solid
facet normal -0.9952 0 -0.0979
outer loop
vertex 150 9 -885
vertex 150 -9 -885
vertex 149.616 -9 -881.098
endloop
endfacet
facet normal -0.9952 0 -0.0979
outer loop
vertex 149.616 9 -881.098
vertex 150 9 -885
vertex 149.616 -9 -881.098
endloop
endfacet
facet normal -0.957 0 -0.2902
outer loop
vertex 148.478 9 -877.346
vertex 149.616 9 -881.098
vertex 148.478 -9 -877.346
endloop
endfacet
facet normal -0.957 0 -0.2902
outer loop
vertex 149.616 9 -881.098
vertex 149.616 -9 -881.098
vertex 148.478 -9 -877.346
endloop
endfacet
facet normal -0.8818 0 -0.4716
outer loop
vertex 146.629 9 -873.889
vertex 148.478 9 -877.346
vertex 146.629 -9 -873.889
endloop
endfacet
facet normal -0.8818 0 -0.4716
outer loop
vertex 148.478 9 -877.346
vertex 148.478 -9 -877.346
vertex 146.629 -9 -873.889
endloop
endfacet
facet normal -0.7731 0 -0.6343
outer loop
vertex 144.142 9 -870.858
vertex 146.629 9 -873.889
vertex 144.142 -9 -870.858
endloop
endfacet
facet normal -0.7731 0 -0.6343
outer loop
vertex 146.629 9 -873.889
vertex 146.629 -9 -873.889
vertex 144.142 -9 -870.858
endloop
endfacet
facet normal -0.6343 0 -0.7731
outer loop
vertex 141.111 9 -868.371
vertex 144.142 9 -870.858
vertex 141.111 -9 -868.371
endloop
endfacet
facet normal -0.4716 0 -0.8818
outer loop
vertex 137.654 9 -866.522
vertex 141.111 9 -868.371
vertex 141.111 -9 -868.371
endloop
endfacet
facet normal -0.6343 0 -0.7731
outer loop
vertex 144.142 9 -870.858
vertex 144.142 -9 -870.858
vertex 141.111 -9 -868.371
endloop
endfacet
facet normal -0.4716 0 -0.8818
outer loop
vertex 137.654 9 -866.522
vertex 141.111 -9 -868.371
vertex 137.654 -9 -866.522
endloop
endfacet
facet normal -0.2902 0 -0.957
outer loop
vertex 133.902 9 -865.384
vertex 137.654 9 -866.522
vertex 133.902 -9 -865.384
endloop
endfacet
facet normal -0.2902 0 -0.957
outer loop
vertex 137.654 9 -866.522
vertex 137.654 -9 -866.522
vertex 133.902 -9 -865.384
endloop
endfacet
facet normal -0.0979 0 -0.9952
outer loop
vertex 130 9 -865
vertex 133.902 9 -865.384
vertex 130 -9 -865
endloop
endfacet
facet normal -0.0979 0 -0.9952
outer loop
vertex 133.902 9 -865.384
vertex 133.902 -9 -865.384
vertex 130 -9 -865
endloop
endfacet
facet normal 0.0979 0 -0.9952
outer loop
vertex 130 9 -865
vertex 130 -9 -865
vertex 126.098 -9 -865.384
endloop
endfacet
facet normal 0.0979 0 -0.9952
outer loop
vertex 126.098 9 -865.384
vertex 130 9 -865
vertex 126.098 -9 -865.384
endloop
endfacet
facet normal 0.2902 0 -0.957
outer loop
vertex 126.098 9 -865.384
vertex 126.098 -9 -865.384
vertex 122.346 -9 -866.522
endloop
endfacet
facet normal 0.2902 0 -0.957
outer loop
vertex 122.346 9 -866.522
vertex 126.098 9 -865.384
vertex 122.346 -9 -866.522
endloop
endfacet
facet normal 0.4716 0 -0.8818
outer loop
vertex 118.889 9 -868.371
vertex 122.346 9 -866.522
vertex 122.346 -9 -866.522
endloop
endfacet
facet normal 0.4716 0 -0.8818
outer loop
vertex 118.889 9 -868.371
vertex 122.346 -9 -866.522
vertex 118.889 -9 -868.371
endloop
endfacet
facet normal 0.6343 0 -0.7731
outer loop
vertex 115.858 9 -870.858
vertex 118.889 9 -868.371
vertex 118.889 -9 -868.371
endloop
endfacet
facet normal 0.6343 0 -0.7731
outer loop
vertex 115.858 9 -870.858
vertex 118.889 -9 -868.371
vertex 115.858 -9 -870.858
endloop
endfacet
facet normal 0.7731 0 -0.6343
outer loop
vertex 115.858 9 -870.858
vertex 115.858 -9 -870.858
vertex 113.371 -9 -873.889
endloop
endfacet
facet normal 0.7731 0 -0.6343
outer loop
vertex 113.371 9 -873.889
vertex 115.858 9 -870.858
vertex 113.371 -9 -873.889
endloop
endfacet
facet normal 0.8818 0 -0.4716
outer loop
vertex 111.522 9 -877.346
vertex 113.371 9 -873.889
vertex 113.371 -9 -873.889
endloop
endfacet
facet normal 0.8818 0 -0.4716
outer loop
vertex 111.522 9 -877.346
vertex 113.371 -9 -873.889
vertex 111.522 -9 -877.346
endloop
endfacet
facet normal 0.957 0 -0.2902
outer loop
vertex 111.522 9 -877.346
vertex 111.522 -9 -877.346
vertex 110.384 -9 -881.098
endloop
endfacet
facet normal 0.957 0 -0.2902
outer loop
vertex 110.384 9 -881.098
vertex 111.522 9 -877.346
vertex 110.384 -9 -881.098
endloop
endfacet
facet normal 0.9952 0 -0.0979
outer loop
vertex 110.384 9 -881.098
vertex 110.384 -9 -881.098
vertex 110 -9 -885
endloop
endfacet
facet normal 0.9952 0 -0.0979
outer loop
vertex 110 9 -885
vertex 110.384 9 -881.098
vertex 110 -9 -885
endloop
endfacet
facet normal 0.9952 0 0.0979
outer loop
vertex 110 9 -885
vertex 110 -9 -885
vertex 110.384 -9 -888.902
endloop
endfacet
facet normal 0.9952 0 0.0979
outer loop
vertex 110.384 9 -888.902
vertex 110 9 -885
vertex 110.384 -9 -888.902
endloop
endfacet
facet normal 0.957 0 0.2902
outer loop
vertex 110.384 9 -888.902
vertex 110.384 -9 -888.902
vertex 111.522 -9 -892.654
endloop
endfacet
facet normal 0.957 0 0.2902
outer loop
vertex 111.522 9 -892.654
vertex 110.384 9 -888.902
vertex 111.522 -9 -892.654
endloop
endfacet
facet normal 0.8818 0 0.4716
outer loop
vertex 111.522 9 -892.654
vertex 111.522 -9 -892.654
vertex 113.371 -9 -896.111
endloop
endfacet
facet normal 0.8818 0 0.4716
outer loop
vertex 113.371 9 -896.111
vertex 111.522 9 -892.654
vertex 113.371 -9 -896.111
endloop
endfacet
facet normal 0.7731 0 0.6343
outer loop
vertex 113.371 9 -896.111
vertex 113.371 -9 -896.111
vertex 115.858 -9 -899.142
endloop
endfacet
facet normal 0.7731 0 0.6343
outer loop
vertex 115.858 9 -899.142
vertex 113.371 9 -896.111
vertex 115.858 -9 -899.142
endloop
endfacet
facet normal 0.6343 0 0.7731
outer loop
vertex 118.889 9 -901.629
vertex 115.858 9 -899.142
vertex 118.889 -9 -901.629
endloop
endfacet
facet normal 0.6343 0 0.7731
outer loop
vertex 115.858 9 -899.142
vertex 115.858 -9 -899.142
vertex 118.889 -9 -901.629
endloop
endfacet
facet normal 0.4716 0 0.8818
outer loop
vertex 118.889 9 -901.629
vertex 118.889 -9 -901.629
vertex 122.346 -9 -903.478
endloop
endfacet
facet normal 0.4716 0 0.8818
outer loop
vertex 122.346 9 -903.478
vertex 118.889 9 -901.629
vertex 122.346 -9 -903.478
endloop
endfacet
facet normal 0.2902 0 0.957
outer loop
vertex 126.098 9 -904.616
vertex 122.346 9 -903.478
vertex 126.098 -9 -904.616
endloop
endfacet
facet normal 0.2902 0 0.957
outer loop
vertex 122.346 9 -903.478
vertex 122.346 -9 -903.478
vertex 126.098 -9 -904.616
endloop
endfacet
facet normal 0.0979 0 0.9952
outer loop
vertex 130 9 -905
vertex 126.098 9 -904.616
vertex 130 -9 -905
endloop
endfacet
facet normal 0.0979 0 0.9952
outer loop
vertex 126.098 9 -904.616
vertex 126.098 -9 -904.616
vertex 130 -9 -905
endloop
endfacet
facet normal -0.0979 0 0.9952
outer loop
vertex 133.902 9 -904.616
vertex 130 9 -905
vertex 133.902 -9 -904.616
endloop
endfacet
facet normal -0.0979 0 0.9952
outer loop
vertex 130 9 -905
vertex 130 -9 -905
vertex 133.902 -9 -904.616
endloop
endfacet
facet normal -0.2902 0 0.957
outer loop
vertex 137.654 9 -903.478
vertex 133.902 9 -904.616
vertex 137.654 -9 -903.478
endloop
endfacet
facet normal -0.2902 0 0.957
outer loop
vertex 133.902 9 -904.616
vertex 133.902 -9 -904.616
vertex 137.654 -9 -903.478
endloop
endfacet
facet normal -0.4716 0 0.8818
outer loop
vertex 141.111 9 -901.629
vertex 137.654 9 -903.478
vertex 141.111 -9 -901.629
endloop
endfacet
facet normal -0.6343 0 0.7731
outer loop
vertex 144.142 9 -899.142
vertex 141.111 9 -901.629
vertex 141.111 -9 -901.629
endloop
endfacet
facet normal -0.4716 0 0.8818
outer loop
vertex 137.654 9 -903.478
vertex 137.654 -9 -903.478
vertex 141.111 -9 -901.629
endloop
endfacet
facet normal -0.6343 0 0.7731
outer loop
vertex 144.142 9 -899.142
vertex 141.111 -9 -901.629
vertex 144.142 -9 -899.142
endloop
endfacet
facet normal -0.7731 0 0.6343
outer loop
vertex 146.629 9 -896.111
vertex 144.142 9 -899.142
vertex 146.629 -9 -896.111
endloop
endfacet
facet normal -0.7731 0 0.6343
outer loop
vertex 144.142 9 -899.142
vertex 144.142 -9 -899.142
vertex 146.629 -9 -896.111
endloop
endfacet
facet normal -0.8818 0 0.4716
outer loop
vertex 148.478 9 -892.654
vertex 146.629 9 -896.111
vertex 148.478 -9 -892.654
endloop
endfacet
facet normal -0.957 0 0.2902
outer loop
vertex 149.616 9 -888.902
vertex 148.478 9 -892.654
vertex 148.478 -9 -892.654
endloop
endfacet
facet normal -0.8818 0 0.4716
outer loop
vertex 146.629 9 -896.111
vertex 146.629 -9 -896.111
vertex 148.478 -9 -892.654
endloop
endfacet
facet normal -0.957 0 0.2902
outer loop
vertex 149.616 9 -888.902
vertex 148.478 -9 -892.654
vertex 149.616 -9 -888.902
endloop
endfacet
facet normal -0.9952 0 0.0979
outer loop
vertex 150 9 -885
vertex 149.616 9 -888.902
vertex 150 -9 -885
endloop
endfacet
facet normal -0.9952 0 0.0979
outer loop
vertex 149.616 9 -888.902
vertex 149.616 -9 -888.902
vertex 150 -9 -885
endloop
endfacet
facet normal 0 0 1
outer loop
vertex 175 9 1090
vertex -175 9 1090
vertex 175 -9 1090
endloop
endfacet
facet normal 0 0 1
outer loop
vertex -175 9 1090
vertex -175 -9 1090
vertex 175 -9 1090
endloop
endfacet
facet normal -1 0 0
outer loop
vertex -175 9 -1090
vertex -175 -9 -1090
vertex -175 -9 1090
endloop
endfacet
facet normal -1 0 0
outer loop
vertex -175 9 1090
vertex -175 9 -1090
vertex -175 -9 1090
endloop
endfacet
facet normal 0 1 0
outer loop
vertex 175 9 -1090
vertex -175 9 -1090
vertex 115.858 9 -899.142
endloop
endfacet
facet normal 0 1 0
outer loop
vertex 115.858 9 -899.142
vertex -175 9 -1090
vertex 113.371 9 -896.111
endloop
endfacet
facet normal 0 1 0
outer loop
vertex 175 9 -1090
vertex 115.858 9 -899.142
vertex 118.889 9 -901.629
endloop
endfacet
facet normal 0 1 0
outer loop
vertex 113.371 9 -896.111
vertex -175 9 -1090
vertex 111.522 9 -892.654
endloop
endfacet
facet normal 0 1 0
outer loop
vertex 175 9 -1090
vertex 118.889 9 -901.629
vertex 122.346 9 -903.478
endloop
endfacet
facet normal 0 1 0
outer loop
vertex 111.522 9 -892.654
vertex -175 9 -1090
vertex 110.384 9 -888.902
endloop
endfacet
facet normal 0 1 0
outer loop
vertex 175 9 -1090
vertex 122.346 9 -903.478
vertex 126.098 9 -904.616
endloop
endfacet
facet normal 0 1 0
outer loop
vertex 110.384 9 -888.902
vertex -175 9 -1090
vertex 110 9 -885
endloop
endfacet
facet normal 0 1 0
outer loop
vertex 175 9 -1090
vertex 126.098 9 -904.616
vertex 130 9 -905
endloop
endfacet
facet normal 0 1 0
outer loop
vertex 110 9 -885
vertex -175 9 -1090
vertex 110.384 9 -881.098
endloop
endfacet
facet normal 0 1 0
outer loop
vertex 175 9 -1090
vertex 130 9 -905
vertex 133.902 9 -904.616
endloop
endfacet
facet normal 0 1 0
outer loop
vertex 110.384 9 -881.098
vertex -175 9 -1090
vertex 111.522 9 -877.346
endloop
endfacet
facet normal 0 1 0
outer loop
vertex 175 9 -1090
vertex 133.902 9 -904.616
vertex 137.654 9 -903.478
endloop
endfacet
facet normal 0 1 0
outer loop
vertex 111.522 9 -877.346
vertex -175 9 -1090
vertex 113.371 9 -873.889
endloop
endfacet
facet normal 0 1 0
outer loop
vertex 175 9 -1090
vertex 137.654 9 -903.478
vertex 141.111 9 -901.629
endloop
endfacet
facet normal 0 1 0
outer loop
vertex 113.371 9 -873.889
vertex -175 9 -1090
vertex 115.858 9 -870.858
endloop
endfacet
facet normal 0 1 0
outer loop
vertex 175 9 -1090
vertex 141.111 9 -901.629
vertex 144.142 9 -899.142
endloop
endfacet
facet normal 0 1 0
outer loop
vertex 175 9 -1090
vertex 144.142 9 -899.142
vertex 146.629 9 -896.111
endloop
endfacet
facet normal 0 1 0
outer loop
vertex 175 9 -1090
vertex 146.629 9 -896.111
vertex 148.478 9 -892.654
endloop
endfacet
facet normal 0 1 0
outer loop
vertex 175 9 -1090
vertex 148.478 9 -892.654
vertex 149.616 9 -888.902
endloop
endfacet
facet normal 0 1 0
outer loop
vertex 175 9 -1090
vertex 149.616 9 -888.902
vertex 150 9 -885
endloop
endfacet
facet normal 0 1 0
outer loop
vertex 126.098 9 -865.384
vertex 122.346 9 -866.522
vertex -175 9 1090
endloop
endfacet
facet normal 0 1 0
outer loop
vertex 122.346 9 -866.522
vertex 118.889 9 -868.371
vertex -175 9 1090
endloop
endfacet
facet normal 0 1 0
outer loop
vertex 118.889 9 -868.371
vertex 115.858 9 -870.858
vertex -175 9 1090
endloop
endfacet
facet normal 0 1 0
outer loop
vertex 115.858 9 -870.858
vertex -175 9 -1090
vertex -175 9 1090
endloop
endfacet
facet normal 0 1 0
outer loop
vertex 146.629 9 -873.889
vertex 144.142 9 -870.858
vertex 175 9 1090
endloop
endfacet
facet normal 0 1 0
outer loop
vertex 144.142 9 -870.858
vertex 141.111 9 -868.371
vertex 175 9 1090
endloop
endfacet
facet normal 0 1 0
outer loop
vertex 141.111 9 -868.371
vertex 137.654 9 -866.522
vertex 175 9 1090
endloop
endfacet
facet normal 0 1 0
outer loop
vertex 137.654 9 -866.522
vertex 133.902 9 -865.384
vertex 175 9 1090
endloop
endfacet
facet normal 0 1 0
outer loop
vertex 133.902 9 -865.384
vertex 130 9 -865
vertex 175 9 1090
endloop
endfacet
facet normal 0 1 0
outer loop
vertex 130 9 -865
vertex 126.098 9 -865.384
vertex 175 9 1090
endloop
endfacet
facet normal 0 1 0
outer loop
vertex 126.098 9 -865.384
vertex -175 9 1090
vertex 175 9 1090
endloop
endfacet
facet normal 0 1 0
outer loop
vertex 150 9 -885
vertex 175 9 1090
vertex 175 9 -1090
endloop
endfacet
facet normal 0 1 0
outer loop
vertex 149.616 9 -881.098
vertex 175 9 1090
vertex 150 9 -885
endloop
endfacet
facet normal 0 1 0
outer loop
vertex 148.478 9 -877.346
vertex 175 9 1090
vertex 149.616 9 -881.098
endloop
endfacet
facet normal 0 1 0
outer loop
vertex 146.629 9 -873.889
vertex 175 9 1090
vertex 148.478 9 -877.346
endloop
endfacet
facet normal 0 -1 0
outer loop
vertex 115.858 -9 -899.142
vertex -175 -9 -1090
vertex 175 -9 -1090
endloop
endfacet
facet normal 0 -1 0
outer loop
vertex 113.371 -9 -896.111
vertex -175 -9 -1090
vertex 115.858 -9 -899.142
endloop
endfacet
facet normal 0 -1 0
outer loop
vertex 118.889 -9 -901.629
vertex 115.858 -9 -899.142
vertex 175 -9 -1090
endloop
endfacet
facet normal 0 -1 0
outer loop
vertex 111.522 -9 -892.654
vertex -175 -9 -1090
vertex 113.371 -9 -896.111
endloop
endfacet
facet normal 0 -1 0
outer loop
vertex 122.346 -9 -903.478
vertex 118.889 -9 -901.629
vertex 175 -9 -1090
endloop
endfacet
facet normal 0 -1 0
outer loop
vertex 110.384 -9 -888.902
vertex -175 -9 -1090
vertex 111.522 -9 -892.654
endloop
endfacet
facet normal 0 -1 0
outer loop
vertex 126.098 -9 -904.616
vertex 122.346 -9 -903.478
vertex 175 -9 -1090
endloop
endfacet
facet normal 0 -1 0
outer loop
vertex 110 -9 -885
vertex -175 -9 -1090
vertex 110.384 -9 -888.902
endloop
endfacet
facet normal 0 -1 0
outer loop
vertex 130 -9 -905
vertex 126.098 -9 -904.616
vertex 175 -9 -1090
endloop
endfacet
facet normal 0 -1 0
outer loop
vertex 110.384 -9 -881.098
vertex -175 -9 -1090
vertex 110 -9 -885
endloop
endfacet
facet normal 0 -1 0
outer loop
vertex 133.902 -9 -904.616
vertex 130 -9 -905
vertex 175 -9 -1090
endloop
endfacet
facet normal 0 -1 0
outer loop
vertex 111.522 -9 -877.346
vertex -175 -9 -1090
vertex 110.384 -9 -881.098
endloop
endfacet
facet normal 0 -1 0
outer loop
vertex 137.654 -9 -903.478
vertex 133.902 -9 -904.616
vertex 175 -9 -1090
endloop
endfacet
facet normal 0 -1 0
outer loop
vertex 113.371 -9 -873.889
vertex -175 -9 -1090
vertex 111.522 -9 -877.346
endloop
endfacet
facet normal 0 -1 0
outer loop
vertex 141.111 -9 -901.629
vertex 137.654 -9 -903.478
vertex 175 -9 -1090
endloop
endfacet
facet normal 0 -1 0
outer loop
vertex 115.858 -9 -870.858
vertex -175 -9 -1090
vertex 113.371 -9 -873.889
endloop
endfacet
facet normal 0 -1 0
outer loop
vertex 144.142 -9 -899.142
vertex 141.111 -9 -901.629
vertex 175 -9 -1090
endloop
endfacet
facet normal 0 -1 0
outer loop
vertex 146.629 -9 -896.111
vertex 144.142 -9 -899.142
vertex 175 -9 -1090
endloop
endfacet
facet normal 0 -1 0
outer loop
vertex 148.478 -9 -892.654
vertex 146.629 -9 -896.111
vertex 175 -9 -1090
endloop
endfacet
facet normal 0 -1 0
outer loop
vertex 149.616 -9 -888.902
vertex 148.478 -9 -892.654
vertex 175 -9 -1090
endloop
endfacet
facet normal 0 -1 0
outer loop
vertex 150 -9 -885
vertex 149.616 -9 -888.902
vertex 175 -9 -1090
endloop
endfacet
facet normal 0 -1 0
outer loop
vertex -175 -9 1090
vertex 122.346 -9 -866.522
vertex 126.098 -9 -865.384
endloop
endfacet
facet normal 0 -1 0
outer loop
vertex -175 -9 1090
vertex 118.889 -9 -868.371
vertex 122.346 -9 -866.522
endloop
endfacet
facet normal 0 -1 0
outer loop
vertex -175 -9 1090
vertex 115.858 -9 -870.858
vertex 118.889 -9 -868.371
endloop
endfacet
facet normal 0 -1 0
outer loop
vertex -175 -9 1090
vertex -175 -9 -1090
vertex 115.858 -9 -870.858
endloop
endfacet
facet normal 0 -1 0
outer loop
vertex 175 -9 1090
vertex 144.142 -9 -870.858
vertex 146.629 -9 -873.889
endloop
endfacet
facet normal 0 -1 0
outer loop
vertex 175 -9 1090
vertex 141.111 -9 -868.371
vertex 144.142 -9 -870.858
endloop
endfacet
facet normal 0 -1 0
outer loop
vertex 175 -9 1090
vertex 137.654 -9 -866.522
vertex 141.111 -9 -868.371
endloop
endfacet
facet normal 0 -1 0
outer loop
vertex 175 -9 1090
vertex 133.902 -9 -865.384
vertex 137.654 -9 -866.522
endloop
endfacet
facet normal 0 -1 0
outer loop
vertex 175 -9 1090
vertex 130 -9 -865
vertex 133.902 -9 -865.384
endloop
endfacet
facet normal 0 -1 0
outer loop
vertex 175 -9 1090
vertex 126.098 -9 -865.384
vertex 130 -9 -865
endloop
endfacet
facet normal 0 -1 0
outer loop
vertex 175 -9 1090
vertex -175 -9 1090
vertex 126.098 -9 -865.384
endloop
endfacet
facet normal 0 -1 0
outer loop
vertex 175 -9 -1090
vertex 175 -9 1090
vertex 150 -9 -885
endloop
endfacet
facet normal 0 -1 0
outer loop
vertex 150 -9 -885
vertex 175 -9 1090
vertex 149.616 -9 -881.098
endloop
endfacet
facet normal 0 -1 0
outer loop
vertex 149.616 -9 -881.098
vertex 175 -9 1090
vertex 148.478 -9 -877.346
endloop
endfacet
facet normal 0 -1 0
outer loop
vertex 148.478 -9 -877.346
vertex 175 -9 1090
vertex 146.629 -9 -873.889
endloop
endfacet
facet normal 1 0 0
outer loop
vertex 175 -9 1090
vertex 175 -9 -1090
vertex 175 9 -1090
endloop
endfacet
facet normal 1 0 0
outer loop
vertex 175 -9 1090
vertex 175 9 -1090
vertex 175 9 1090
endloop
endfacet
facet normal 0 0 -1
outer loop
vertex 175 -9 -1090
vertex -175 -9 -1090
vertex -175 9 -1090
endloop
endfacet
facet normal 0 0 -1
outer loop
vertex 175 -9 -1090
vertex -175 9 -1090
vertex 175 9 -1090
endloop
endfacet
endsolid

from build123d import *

# Parameters (mm, degrees)
F0_W     = 350
F0_H     = 2180
F1_DEPTH = 9
F2_R     = 20
F3_DEPTH = 25


with BuildPart() as f1:
    # F0 (on Front) → F1 (new body, symmetric)
    with BuildSketch(Plane.XZ):
        Rectangle(F0_W, F0_H)
    extrude(amount=F1_DEPTH, both=True)

    # F2 (on face) → F3 (cut)
    with BuildSketch(Plane.XZ.offset(9)):
        with Locations((130, -885)):
            Circle(F2_R)
    extrude(amount=-F3_DEPTH, mode=Mode.SUBTRACT)


solid = f1.part
